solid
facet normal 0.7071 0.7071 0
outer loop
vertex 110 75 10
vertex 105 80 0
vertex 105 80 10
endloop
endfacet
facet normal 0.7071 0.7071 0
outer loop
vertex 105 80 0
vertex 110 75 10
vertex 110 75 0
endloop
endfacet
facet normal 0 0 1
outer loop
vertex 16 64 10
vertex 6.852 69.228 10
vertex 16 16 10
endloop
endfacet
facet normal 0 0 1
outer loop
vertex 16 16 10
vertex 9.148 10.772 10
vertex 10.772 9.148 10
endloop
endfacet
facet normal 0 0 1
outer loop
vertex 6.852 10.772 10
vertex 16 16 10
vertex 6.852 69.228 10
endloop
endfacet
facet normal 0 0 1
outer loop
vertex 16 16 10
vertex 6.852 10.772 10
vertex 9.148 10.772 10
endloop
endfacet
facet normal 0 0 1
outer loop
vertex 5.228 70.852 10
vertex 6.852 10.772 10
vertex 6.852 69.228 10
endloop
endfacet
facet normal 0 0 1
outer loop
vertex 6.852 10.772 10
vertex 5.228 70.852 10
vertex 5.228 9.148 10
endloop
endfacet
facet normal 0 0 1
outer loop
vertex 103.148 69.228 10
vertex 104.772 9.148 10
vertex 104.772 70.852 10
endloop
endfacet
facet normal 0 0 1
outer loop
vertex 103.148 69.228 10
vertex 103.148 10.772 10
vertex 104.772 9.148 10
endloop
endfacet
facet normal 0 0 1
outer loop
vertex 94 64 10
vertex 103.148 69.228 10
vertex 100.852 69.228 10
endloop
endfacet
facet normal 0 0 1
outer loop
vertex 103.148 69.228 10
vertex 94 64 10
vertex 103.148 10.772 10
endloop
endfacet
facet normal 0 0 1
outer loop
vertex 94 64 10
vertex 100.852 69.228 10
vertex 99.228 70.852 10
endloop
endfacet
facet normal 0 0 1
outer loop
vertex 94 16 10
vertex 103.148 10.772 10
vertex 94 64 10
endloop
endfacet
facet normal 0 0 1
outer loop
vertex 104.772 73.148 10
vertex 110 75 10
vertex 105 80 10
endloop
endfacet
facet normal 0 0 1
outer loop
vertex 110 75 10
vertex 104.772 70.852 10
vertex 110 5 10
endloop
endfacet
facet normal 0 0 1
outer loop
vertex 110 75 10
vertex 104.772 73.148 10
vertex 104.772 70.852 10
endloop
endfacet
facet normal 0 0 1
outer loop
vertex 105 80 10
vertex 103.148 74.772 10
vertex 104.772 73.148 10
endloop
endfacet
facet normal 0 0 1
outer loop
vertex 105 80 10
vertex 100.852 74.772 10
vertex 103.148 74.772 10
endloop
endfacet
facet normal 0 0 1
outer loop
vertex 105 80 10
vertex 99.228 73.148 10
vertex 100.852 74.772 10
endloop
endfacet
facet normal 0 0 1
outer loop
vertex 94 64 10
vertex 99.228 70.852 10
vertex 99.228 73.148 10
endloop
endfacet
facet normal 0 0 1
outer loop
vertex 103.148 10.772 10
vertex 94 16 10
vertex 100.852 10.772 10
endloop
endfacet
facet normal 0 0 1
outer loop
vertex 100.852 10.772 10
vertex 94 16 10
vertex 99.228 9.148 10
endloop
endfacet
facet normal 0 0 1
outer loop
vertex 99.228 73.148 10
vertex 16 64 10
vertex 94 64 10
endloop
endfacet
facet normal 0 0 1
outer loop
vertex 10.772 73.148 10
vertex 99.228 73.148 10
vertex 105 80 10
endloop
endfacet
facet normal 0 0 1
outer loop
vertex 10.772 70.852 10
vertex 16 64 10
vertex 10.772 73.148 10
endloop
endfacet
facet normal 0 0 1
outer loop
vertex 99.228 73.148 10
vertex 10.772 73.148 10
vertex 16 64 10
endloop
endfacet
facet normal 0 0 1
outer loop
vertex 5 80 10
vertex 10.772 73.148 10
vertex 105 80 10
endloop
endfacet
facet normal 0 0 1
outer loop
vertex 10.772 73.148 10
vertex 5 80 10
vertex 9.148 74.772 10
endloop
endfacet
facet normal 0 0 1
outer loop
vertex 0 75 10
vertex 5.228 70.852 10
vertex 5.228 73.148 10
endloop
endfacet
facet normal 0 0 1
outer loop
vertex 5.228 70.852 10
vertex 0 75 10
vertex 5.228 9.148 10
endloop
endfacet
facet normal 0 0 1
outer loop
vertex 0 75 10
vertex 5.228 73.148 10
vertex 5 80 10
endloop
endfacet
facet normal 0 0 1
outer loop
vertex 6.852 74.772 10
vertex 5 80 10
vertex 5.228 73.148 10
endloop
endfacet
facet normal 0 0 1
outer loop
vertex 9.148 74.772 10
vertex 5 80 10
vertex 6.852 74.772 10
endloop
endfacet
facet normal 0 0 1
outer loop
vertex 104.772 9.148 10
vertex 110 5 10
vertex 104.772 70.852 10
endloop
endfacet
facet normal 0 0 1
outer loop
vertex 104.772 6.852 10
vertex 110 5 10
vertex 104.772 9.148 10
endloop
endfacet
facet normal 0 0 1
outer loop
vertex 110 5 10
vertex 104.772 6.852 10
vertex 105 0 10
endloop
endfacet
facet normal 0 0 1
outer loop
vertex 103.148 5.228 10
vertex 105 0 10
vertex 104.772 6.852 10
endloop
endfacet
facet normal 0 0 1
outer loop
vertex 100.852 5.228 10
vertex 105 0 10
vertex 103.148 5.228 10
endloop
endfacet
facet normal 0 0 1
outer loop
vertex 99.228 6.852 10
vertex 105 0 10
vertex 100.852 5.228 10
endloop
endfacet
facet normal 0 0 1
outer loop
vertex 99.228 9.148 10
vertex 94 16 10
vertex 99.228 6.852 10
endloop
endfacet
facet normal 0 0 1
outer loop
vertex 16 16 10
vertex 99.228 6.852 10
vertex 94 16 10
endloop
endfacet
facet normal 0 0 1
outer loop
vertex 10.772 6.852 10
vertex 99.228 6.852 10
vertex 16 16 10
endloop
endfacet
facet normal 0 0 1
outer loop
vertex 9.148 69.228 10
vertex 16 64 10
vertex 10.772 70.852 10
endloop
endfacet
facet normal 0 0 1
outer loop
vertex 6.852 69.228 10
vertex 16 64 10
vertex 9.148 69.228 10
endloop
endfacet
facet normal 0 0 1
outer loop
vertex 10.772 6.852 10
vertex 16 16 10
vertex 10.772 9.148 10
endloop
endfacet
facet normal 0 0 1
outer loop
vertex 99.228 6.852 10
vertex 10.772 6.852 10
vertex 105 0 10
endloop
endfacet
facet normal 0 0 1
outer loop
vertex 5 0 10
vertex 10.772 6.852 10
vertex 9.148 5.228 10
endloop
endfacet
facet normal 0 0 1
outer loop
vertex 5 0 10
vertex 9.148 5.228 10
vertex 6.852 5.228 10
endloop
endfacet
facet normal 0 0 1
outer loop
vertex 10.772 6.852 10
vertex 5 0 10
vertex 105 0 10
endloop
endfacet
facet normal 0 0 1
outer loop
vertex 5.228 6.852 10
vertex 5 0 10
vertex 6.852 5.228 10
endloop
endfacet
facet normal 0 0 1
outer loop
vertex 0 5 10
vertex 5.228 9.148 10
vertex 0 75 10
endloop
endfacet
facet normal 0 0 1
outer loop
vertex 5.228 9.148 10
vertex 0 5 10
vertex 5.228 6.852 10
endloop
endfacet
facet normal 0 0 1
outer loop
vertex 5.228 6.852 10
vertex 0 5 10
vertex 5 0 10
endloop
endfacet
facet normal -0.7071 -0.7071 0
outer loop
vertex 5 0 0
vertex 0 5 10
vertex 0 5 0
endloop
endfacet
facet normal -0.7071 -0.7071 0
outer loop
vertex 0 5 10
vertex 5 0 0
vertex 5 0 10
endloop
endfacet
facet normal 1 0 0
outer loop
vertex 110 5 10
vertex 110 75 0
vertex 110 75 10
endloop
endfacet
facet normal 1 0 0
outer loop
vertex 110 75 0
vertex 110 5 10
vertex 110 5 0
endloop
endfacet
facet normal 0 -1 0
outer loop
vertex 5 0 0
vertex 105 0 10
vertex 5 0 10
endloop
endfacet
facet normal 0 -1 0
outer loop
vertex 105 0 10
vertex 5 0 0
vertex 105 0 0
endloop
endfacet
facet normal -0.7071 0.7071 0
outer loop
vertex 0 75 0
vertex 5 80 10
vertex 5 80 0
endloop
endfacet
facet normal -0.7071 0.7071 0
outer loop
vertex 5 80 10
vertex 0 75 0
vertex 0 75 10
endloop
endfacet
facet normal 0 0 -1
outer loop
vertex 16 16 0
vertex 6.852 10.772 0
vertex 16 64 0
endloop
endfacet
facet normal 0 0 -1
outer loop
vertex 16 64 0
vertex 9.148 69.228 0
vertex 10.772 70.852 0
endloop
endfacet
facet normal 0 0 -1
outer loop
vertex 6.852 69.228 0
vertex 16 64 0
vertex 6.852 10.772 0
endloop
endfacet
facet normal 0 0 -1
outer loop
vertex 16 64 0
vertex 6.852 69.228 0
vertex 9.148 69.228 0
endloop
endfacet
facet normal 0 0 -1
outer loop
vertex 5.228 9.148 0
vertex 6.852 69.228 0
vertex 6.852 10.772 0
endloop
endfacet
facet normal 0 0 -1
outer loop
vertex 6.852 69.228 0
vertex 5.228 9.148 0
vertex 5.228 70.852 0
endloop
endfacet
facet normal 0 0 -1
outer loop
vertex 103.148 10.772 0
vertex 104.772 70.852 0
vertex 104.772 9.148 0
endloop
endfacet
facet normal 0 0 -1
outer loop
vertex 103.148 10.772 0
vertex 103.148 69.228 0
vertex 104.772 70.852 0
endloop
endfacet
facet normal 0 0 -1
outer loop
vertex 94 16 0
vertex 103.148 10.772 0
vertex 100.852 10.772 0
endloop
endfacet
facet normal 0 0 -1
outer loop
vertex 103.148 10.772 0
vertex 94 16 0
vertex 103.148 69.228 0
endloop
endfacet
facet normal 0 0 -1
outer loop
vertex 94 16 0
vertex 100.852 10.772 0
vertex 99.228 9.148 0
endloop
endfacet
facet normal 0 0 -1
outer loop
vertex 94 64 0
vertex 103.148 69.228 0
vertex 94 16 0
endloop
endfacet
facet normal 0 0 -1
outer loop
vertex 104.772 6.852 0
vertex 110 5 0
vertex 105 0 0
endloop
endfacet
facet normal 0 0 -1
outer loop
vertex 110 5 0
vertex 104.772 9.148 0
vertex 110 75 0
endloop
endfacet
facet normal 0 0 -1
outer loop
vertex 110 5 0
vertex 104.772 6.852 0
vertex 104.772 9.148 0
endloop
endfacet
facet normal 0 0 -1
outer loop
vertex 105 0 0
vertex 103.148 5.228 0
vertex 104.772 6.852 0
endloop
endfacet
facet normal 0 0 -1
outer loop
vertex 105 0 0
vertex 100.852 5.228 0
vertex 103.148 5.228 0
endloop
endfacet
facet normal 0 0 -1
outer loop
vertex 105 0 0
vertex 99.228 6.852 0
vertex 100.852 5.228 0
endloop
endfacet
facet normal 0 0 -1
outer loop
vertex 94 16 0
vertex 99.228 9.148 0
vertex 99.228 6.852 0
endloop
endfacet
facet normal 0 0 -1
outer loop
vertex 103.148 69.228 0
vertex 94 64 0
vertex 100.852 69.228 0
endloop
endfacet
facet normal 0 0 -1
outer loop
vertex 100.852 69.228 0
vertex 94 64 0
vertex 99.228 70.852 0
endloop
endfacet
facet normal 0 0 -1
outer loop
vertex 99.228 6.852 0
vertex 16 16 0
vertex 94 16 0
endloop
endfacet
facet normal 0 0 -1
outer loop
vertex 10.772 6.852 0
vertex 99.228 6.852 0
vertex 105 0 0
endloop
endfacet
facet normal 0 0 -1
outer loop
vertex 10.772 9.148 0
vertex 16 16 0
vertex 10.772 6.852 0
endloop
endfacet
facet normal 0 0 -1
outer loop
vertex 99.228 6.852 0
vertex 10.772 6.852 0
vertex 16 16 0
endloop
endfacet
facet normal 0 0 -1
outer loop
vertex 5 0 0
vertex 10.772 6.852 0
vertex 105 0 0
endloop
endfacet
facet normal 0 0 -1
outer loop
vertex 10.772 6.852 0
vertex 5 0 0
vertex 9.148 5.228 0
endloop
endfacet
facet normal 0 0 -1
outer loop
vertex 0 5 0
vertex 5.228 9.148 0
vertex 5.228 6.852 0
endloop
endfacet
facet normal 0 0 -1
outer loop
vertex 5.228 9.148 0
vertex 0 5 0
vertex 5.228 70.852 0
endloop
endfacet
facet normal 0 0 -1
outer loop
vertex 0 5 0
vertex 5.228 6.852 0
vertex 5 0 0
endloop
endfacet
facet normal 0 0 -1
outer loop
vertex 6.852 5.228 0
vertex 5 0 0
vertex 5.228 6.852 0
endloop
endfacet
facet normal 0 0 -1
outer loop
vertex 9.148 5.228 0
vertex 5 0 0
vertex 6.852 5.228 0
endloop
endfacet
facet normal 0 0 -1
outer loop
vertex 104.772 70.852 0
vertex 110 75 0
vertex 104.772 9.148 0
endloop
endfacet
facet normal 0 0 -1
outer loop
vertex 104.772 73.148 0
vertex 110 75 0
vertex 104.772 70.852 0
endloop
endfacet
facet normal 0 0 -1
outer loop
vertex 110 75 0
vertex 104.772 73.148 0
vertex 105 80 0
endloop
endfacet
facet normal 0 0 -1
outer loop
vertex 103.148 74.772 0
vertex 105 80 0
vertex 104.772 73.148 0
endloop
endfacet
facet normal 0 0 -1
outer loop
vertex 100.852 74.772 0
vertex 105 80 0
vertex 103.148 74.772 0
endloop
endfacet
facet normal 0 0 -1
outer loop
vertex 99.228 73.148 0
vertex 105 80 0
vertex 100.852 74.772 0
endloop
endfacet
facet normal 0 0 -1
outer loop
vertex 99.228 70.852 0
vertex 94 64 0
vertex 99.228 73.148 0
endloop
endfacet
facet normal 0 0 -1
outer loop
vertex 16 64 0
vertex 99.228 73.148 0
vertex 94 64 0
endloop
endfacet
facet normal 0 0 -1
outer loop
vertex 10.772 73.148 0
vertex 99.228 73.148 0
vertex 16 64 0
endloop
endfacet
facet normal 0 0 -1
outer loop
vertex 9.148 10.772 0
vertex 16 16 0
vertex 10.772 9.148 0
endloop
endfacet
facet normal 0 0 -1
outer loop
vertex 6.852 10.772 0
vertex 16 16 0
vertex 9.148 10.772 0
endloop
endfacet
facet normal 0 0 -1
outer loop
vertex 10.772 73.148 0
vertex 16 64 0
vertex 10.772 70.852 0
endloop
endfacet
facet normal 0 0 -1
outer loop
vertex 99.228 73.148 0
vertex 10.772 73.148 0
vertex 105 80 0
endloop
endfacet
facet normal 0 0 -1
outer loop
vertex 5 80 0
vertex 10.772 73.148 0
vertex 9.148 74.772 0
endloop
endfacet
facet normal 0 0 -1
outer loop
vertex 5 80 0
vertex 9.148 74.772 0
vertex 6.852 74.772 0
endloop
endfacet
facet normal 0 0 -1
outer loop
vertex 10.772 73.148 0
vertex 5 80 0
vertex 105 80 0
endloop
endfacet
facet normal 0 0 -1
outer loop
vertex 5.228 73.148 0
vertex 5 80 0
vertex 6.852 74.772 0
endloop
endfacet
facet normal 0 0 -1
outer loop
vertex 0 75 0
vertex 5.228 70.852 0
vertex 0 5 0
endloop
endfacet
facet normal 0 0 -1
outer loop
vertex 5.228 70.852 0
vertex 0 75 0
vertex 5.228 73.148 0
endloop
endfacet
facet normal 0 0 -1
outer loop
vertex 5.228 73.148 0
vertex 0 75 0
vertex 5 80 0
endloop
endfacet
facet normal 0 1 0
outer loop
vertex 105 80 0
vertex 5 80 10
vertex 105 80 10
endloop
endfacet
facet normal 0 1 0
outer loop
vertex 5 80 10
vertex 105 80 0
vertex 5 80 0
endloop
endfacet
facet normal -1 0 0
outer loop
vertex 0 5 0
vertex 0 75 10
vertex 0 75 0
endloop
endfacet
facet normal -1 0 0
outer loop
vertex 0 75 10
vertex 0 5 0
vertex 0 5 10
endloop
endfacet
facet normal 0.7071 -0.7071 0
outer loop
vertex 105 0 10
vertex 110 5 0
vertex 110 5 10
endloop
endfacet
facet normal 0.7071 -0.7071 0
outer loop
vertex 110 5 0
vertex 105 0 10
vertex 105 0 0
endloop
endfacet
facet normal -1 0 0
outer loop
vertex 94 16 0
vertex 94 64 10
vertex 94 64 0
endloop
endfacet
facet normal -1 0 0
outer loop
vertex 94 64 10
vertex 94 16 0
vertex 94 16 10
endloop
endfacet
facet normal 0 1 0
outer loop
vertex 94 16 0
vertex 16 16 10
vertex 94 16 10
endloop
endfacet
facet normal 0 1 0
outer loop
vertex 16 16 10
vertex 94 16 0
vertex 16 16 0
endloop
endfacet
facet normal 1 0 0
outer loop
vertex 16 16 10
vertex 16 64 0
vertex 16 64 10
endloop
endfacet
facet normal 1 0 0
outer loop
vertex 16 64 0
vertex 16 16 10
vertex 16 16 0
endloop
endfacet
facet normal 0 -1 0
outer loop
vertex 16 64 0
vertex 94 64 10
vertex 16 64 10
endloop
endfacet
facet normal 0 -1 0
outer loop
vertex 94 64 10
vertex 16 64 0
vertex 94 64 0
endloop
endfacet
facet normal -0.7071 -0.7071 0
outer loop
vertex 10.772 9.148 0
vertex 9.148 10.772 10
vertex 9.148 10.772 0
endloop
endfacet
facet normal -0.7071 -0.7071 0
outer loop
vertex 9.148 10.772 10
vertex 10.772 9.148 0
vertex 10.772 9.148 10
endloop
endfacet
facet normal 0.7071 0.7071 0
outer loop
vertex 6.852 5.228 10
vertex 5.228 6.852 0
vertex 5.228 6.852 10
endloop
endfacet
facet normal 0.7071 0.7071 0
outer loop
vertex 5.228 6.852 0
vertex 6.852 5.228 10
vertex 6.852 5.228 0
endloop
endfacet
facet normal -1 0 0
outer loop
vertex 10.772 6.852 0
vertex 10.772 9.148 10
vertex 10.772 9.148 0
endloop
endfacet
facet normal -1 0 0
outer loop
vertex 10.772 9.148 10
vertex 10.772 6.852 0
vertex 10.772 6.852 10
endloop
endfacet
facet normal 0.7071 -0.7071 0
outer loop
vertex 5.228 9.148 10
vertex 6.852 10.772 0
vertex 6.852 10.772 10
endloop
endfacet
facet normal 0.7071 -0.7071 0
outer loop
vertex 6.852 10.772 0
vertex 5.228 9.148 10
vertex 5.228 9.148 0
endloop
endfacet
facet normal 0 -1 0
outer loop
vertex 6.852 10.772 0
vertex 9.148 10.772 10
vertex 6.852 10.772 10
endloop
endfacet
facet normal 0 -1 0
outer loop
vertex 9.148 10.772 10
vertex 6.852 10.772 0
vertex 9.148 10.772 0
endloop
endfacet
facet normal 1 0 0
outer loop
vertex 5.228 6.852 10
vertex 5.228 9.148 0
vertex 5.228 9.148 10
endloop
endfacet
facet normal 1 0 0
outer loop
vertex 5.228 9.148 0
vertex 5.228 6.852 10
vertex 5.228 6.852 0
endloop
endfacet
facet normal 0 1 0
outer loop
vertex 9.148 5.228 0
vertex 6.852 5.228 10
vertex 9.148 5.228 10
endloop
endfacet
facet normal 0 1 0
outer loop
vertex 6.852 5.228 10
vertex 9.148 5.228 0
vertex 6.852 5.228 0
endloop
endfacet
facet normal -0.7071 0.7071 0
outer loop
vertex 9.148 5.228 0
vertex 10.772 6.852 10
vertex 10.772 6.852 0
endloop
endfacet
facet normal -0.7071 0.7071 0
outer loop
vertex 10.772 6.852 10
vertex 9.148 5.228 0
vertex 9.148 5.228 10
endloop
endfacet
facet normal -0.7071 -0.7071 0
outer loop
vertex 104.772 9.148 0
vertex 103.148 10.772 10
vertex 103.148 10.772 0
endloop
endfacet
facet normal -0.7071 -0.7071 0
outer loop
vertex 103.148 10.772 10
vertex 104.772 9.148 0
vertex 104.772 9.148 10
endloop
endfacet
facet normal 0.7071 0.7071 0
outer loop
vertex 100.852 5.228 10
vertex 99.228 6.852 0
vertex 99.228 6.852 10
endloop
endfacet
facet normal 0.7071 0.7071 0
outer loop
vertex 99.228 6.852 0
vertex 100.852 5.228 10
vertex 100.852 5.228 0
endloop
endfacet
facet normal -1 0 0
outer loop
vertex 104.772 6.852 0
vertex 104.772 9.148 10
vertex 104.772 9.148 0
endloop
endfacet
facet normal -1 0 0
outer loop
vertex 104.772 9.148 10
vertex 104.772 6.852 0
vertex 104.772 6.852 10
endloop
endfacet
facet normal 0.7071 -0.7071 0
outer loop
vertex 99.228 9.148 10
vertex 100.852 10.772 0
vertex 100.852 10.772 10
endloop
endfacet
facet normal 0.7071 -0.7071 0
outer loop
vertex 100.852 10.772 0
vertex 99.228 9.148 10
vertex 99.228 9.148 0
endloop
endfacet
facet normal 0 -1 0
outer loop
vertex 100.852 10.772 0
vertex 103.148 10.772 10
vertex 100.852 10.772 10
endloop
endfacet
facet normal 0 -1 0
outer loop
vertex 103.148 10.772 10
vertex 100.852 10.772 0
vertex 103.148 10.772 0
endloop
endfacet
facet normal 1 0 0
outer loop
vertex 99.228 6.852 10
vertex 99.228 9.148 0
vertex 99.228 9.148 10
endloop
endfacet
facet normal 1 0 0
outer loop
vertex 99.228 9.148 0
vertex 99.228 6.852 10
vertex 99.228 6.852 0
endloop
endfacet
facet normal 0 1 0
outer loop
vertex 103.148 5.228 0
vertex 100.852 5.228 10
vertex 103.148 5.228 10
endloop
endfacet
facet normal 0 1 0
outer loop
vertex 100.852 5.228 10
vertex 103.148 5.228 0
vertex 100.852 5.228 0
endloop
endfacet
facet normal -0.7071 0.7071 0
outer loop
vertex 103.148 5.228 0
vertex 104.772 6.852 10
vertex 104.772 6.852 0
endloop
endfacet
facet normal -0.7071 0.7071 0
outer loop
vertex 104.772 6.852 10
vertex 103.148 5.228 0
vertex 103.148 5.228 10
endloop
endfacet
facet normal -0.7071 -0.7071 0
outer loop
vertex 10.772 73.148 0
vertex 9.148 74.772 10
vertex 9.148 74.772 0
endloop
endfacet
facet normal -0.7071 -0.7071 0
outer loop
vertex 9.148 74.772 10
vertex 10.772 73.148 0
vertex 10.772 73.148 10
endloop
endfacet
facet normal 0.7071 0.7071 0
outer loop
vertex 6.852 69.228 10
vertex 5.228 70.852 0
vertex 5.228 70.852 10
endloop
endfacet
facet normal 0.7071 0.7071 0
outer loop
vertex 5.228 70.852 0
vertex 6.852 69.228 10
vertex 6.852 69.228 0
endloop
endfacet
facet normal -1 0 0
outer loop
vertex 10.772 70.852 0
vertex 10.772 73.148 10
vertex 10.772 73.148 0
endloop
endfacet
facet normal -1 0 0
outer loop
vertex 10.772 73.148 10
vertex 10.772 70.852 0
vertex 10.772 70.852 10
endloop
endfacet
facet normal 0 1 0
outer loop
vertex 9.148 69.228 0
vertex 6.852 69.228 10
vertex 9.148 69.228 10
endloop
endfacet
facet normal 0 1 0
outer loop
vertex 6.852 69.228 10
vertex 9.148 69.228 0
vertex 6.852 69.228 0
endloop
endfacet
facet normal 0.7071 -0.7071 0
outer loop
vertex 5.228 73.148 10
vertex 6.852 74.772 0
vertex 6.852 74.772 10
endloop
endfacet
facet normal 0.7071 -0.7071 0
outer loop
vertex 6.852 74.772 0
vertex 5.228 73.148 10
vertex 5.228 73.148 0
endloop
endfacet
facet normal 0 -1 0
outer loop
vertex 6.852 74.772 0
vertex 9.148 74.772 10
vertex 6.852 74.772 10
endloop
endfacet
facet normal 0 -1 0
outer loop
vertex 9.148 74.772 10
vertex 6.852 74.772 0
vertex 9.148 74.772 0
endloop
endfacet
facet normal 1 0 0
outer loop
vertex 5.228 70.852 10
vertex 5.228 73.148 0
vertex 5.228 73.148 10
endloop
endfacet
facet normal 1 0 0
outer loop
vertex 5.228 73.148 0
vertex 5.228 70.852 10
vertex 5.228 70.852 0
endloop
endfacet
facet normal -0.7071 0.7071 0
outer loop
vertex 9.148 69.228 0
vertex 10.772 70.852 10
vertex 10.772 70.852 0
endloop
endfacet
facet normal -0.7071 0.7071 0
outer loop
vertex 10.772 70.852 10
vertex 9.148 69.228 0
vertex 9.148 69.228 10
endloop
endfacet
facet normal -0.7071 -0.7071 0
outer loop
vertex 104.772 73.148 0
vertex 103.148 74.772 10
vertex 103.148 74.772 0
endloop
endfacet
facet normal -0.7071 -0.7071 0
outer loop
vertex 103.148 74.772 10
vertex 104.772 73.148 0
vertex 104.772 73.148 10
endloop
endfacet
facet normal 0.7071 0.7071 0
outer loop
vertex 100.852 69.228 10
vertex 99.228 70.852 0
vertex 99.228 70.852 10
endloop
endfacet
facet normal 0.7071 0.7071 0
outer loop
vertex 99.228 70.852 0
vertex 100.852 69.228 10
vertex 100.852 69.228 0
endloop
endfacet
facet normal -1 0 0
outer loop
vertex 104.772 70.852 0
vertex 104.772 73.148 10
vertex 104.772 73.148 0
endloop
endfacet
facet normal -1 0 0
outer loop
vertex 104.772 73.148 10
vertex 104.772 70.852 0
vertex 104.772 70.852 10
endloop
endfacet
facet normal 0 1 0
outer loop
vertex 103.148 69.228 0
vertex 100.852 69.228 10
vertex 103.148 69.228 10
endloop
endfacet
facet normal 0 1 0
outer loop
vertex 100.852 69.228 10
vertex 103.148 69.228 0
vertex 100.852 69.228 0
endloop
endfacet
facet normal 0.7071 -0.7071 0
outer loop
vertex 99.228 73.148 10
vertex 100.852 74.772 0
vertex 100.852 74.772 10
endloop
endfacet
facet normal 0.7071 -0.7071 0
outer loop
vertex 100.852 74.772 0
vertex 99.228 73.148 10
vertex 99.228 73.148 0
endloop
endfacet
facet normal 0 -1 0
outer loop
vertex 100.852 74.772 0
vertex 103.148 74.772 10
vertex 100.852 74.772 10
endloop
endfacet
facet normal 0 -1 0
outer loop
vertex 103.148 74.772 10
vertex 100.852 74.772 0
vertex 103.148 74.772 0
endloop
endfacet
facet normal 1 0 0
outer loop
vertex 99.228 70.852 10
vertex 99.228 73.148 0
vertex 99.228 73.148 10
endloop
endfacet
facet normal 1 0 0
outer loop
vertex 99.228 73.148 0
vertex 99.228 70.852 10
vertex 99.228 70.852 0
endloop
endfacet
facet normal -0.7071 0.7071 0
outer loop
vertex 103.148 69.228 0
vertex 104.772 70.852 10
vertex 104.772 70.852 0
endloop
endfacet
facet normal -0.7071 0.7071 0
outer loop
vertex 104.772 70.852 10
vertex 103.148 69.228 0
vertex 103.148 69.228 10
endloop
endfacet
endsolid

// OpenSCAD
$fn = 32;

// ----------------------------------------------------------------------
// Frame plate: 110 x 80 frame, 16 mm rails
// ----------------------------------------------------------------------

// --- parameters (mm) ---
plate_l = 110;            // plate length, X
plate_w = 80;             // plate width, Y
plate_t = 10;             // plate thickness, Z (extrusion height)
corner_c = 5;             // corner chamfer
frame_bar = 16;           // frame rail width
bolt_r = 3;               // corner bolt window radius
bolt_inset = 8;           // bolt centre inset from the edges

win_l = plate_l - 2 * frame_bar;  // window length
win_w = plate_w - 2 * frame_bar;  // window width
bolt_d = 2 * bolt_r;  // corner hole diameter

profile = [[5, 0], [105, 0], [110, 5], [110, 75], [105, 80], [5, 80], [0, 75], [0, 5]];  // primary outline, 8 points, counter clockwise
void_1 = [[16, 16], [94, 16], [94, 64], [16, 64]];  // the window, 4 points
void_2 = [[10.772, 9.148], [9.148, 10.772], [6.852, 10.772], [5.228, 9.148], [5.228, 6.852], [6.852, 5.228], [9.148, 5.228], [10.772, 6.852]];  // corner bolt window, 8 points
void_3 = [[104.772, 9.148], [103.148, 10.772], [100.852, 10.772], [99.228, 9.148], [99.228, 6.852], [100.852, 5.228], [103.148, 5.228], [104.772, 6.852]];  // corner bolt window, 8 points
void_4 = [[10.772, 73.148], [9.148, 74.772], [6.852, 74.772], [5.228, 73.148], [5.228, 70.852], [6.852, 69.228], [9.148, 69.228], [10.772, 70.852]];  // corner bolt window, 8 points
void_5 = [[104.772, 73.148], [103.148, 74.772], [100.852, 74.772], [99.228, 73.148], [99.228, 70.852], [100.852, 69.228], [103.148, 69.228], [104.772, 70.852]];  // corner bolt window, 8 points

// --- the one profile operation ---
difference() {
  linear_extrude(height = plate_t) polygon(points = profile);
  translate([0, 0, -1])
    linear_extrude(height = plate_t + 2) polygon(points = void_1);
  translate([0, 0, -1])
    linear_extrude(height = plate_t + 2) polygon(points = void_2);
  translate([0, 0, -1])
    linear_extrude(height = plate_t + 2) polygon(points = void_3);
  translate([0, 0, -1])
    linear_extrude(height = plate_t + 2) polygon(points = void_4);
  translate([0, 0, -1])
    linear_extrude(height = plate_t + 2) polygon(points = void_5);
}
